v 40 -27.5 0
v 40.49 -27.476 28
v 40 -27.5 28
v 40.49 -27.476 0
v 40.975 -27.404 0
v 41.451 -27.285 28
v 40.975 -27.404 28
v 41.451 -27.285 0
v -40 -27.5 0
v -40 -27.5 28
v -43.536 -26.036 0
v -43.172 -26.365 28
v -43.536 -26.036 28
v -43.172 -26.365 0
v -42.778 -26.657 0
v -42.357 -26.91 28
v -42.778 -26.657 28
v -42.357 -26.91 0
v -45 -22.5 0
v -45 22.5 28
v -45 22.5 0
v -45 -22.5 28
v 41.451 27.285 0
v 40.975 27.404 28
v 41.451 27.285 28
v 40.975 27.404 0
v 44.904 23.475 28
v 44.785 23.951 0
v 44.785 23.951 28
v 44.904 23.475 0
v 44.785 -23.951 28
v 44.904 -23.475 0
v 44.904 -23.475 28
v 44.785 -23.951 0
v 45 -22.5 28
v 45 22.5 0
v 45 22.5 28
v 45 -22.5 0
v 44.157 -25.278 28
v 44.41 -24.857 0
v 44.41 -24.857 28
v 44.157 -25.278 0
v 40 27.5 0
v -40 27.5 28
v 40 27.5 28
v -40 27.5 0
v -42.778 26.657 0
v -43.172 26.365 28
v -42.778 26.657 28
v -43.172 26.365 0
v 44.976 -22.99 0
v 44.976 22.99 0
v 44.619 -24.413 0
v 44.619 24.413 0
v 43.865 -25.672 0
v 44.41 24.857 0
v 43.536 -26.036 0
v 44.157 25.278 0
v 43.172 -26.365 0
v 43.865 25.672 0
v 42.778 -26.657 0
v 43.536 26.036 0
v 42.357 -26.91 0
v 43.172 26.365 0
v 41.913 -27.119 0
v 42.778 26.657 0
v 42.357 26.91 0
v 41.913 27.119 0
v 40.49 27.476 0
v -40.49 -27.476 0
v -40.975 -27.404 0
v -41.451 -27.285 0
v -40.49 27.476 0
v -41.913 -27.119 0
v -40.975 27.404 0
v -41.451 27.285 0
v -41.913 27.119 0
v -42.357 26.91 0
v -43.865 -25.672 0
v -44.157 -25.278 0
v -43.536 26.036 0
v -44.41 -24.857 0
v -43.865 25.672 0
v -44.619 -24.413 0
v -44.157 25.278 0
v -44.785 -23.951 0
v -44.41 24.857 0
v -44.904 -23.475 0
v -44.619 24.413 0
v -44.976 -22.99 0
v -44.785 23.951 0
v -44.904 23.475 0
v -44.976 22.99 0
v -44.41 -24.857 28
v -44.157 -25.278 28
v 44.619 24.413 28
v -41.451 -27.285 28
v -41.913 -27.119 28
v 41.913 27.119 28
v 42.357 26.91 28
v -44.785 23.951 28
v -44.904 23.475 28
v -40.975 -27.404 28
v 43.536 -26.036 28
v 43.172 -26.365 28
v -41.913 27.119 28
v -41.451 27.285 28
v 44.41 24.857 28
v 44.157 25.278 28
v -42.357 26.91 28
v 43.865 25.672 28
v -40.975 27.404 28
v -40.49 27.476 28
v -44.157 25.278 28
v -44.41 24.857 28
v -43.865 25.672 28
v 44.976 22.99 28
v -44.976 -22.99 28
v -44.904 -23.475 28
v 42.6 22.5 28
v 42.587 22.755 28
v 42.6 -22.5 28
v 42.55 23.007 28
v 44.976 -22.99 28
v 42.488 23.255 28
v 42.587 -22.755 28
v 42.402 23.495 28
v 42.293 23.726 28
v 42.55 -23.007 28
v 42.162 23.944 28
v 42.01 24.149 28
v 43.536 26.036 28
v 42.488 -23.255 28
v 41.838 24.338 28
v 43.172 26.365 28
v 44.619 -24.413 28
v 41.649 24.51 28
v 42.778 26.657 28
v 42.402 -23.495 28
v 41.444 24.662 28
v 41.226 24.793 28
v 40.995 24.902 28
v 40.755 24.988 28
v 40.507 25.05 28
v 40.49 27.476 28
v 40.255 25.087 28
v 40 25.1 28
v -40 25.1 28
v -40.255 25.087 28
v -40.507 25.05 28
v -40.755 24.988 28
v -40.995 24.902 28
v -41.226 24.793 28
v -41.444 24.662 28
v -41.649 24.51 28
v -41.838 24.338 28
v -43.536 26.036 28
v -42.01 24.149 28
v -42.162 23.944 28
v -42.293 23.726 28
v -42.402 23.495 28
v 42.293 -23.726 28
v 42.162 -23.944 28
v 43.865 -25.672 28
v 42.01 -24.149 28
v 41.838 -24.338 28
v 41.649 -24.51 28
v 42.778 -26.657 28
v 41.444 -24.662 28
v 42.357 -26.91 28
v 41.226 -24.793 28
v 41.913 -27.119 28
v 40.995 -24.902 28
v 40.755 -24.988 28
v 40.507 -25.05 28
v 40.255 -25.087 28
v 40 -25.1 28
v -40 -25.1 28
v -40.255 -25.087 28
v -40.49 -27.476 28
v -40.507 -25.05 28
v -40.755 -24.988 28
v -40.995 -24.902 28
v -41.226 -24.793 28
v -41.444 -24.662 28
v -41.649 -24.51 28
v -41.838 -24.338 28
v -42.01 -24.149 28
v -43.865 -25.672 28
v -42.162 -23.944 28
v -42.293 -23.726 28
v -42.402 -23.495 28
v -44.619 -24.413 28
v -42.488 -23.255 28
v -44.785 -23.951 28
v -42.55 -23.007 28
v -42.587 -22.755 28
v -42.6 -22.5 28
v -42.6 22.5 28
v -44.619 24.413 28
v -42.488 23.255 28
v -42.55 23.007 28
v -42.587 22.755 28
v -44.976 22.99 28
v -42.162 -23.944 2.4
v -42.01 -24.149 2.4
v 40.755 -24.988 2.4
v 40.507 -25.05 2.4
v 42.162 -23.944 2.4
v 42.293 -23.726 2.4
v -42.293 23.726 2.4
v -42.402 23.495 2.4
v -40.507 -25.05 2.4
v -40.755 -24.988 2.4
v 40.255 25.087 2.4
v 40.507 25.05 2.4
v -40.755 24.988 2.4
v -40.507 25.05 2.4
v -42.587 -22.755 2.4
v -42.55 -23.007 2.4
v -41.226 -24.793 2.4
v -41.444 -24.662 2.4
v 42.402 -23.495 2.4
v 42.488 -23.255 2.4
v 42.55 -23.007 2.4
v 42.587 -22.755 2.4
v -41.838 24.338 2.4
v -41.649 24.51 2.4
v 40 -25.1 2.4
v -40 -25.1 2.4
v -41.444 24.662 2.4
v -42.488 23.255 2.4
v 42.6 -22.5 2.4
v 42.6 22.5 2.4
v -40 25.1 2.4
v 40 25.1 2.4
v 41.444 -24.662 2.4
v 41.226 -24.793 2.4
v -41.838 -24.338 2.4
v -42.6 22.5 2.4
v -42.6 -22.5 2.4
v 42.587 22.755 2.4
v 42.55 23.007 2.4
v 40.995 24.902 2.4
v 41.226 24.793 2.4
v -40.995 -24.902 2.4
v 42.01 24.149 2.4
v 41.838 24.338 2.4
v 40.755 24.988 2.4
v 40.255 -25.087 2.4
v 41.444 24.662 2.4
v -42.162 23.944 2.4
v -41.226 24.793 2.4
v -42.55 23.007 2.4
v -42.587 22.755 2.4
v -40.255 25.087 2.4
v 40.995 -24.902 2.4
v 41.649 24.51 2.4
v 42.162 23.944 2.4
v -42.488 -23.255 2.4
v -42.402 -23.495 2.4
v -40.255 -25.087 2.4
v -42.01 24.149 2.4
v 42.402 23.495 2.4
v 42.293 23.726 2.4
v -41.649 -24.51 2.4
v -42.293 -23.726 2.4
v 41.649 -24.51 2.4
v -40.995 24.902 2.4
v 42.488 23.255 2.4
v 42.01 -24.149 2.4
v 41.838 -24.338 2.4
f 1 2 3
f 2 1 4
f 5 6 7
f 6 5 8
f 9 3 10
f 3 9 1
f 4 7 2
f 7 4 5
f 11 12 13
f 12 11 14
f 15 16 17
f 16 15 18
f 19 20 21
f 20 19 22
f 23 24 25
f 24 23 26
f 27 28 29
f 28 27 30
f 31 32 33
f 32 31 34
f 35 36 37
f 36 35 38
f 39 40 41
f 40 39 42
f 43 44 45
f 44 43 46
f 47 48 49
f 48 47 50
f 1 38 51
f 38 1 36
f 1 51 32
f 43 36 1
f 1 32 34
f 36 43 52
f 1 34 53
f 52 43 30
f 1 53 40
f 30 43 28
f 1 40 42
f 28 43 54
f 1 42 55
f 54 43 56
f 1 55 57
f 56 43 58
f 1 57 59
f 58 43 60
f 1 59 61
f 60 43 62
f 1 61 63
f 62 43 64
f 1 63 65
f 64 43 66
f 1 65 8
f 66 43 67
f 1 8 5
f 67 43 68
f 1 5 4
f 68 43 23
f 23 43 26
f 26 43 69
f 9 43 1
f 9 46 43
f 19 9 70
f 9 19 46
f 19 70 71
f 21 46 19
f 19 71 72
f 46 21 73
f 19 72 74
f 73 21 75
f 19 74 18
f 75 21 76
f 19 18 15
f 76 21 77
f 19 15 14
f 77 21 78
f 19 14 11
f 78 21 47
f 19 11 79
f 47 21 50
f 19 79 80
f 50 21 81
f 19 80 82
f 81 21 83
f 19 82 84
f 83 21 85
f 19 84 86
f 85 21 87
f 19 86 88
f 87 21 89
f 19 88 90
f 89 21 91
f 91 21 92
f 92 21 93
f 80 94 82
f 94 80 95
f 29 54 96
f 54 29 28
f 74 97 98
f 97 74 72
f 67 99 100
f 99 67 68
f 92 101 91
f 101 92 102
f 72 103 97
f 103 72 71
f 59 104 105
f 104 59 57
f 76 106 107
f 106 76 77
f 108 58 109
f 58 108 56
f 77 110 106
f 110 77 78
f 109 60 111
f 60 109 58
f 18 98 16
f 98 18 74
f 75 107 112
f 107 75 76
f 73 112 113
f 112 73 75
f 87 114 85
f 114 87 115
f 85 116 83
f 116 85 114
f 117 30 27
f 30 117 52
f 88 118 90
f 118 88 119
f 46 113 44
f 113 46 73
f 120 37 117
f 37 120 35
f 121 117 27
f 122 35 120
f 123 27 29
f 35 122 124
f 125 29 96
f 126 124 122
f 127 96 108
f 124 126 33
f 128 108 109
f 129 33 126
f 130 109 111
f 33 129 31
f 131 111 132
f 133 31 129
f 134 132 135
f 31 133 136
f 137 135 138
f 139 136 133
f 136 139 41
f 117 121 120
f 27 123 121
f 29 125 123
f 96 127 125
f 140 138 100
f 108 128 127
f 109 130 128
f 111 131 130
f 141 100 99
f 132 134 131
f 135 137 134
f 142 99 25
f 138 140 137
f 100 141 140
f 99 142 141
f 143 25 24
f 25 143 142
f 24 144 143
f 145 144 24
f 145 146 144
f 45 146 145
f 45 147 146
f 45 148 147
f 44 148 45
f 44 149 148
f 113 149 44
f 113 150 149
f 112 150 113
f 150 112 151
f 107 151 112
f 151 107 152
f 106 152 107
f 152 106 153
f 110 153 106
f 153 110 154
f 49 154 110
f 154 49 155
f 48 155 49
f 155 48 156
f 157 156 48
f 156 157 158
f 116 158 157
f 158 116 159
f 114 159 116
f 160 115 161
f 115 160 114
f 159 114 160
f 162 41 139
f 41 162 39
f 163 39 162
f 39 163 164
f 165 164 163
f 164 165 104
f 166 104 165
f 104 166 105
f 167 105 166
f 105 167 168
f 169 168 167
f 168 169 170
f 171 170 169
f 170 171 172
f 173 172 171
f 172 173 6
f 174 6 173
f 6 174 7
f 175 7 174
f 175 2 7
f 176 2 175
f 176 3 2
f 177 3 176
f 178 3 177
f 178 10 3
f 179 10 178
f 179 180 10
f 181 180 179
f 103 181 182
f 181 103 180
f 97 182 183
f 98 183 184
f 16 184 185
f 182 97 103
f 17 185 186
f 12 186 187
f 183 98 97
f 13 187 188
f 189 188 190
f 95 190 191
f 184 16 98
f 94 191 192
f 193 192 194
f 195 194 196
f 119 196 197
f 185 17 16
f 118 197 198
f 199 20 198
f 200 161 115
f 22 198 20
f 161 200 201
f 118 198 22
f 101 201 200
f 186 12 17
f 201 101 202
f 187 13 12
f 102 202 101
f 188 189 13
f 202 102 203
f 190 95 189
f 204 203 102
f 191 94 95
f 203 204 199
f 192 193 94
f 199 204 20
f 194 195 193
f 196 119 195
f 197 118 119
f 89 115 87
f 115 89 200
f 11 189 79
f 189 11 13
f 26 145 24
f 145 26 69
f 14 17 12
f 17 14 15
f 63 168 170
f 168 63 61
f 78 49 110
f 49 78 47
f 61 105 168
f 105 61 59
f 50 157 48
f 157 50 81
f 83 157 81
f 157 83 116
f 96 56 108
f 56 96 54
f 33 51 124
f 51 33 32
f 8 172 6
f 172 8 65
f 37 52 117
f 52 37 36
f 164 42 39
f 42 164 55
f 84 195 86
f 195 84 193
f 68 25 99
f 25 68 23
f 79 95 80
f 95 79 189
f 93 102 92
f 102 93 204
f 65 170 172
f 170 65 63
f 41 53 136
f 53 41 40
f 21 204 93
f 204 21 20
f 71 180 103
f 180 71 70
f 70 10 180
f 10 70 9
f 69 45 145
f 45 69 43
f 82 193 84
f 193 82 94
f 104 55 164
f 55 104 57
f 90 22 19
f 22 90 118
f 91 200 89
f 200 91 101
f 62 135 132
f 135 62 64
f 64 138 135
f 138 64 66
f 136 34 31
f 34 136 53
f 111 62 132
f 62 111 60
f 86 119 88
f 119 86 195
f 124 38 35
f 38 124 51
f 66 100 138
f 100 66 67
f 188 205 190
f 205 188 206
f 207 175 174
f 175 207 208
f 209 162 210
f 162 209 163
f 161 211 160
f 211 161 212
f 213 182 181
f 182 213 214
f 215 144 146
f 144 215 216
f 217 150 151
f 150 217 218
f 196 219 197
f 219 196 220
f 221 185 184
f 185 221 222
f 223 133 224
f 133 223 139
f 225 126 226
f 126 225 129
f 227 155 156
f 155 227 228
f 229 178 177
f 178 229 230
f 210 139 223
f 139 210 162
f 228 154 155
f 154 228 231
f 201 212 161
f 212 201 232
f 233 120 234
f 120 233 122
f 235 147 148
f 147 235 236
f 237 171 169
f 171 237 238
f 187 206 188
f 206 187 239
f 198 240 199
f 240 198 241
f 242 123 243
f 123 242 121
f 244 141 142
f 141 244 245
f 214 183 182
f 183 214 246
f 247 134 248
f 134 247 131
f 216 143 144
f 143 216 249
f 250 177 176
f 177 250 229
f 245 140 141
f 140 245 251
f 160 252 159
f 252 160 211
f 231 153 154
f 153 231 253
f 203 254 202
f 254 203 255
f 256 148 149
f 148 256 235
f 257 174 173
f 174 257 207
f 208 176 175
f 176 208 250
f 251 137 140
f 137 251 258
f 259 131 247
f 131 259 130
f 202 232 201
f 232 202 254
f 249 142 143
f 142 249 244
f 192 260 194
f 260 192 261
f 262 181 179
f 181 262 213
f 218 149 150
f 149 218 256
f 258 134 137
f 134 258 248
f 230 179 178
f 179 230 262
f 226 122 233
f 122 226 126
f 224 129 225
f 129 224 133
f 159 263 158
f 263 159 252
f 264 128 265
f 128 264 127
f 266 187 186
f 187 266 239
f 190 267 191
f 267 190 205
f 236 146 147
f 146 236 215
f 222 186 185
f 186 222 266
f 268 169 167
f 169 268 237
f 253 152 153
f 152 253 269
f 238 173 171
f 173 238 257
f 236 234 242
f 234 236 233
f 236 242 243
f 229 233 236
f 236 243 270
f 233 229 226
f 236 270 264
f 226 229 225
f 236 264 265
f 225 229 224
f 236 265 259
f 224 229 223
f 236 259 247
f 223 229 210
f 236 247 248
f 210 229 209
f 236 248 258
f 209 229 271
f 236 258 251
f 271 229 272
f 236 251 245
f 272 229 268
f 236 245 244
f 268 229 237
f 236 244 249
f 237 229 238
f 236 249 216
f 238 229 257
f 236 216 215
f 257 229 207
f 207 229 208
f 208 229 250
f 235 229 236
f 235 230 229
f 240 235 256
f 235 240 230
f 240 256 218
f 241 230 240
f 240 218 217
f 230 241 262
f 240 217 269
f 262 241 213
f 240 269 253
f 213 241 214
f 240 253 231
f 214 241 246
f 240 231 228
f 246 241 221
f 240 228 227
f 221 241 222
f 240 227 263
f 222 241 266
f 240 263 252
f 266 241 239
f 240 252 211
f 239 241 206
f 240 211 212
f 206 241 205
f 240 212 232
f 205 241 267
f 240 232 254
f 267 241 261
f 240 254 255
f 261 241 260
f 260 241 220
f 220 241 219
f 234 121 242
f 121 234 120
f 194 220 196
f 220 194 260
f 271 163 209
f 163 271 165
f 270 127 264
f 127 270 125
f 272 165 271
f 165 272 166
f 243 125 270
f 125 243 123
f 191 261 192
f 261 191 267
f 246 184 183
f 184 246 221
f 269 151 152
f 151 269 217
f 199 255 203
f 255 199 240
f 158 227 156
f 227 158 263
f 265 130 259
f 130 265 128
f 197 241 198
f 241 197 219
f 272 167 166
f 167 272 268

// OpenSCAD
/*
Model: Open-top electronics tray/enclosure
Units: millimetres
Export: Render (F6), then export STL/3MF
*/

/* [Outer Dimensions] */
outer_w = 90; // [30:1:200]
outer_d = 55; // [30:1:200]
outer_h = 28; // [8:1:100]
corner_r = 5; // [0:0.5:25]

/* [Shell] */
wall = 2.4; // [1.2:0.1:8]
bottom_t = 2.4; // [1.2:0.1:8]

/* [Hidden] */
eps = 0.01;
$fn = 64;

inner_w = outer_w - 2 * wall;
inner_d = outer_d - 2 * wall;
inner_h = outer_h - bottom_t;
outer_r = min(corner_r, min(outer_w, outer_d) / 2 - eps);
inner_r = max(0, outer_r - wall);

assert(outer_w > 2 * wall, "outer_w too small for wall");
assert(outer_d > 2 * wall, "outer_d too small for wall");
assert(outer_h > bottom_t, "outer_h must be greater than bottom_t");
assert(wall >= 1.2, "wall is thin for typical FDM printing");
assert(bottom_t >= 1.2, "bottom_t is thin for typical FDM printing");
assert(outer_r >= 0, "corner_r too large for enclosure dimensions");

module rounded_rect_2d(w, d, r) {
    if (r <= eps)
        square([w, d], center = true);
    else
        offset(r = r)
            offset(delta = -r)
                square([w, d], center = true);
}

module outer_body() {
    linear_extrude(height = outer_h)
        rounded_rect_2d(outer_w, outer_d, outer_r);
}

module inner_cavity_cutter() {
    translate([0, 0, bottom_t])
        linear_extrude(height = inner_h + eps)
            rounded_rect_2d(inner_w, inner_d, inner_r);
}

module model() {
    difference() {
        outer_body();
        inner_cavity_cutter();
    }
}

model();
